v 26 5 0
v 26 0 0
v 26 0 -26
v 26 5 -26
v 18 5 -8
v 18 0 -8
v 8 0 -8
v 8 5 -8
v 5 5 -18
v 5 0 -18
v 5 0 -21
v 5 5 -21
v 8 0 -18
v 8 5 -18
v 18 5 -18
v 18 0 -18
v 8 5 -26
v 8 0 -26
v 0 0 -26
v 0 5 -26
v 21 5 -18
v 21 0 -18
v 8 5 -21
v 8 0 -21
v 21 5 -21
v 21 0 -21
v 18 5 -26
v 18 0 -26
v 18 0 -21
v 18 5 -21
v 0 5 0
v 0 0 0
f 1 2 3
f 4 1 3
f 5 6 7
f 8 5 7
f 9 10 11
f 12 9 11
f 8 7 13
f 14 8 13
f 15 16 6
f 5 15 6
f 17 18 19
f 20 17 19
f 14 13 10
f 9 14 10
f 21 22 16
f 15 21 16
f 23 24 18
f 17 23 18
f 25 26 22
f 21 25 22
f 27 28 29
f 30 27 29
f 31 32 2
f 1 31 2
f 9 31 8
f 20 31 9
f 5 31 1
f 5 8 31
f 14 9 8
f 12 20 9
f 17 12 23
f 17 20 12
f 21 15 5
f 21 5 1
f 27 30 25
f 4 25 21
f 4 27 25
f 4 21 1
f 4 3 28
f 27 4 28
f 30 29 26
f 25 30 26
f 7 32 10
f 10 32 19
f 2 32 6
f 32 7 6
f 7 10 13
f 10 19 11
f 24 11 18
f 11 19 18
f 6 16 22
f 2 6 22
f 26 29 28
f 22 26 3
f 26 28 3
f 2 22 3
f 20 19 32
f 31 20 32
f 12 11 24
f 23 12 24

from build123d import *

# Parameters (mm, degrees)
EXTRUDE_1_DEPTH = 5


with BuildPart() as part:
    # 草图1 → 凸台-拉伸1 (new body)
    with BuildSketch(Plane(origin=(0, 0, 0), x_dir=(1, 0, 0), z_dir=(0, 1, 0))):
        Polygon((0, 26), (0, 0), (26, 0), (26, 26), (18, 26), (18, 21), (21, 21), (21, 18), (18, 18), (18, 8), (8, 8), (8, 18), (5, 18), (5, 21), (8, 21), (8, 26), align=None)
    extrude(amount=EXTRUDE_1_DEPTH)


solid = part.part
